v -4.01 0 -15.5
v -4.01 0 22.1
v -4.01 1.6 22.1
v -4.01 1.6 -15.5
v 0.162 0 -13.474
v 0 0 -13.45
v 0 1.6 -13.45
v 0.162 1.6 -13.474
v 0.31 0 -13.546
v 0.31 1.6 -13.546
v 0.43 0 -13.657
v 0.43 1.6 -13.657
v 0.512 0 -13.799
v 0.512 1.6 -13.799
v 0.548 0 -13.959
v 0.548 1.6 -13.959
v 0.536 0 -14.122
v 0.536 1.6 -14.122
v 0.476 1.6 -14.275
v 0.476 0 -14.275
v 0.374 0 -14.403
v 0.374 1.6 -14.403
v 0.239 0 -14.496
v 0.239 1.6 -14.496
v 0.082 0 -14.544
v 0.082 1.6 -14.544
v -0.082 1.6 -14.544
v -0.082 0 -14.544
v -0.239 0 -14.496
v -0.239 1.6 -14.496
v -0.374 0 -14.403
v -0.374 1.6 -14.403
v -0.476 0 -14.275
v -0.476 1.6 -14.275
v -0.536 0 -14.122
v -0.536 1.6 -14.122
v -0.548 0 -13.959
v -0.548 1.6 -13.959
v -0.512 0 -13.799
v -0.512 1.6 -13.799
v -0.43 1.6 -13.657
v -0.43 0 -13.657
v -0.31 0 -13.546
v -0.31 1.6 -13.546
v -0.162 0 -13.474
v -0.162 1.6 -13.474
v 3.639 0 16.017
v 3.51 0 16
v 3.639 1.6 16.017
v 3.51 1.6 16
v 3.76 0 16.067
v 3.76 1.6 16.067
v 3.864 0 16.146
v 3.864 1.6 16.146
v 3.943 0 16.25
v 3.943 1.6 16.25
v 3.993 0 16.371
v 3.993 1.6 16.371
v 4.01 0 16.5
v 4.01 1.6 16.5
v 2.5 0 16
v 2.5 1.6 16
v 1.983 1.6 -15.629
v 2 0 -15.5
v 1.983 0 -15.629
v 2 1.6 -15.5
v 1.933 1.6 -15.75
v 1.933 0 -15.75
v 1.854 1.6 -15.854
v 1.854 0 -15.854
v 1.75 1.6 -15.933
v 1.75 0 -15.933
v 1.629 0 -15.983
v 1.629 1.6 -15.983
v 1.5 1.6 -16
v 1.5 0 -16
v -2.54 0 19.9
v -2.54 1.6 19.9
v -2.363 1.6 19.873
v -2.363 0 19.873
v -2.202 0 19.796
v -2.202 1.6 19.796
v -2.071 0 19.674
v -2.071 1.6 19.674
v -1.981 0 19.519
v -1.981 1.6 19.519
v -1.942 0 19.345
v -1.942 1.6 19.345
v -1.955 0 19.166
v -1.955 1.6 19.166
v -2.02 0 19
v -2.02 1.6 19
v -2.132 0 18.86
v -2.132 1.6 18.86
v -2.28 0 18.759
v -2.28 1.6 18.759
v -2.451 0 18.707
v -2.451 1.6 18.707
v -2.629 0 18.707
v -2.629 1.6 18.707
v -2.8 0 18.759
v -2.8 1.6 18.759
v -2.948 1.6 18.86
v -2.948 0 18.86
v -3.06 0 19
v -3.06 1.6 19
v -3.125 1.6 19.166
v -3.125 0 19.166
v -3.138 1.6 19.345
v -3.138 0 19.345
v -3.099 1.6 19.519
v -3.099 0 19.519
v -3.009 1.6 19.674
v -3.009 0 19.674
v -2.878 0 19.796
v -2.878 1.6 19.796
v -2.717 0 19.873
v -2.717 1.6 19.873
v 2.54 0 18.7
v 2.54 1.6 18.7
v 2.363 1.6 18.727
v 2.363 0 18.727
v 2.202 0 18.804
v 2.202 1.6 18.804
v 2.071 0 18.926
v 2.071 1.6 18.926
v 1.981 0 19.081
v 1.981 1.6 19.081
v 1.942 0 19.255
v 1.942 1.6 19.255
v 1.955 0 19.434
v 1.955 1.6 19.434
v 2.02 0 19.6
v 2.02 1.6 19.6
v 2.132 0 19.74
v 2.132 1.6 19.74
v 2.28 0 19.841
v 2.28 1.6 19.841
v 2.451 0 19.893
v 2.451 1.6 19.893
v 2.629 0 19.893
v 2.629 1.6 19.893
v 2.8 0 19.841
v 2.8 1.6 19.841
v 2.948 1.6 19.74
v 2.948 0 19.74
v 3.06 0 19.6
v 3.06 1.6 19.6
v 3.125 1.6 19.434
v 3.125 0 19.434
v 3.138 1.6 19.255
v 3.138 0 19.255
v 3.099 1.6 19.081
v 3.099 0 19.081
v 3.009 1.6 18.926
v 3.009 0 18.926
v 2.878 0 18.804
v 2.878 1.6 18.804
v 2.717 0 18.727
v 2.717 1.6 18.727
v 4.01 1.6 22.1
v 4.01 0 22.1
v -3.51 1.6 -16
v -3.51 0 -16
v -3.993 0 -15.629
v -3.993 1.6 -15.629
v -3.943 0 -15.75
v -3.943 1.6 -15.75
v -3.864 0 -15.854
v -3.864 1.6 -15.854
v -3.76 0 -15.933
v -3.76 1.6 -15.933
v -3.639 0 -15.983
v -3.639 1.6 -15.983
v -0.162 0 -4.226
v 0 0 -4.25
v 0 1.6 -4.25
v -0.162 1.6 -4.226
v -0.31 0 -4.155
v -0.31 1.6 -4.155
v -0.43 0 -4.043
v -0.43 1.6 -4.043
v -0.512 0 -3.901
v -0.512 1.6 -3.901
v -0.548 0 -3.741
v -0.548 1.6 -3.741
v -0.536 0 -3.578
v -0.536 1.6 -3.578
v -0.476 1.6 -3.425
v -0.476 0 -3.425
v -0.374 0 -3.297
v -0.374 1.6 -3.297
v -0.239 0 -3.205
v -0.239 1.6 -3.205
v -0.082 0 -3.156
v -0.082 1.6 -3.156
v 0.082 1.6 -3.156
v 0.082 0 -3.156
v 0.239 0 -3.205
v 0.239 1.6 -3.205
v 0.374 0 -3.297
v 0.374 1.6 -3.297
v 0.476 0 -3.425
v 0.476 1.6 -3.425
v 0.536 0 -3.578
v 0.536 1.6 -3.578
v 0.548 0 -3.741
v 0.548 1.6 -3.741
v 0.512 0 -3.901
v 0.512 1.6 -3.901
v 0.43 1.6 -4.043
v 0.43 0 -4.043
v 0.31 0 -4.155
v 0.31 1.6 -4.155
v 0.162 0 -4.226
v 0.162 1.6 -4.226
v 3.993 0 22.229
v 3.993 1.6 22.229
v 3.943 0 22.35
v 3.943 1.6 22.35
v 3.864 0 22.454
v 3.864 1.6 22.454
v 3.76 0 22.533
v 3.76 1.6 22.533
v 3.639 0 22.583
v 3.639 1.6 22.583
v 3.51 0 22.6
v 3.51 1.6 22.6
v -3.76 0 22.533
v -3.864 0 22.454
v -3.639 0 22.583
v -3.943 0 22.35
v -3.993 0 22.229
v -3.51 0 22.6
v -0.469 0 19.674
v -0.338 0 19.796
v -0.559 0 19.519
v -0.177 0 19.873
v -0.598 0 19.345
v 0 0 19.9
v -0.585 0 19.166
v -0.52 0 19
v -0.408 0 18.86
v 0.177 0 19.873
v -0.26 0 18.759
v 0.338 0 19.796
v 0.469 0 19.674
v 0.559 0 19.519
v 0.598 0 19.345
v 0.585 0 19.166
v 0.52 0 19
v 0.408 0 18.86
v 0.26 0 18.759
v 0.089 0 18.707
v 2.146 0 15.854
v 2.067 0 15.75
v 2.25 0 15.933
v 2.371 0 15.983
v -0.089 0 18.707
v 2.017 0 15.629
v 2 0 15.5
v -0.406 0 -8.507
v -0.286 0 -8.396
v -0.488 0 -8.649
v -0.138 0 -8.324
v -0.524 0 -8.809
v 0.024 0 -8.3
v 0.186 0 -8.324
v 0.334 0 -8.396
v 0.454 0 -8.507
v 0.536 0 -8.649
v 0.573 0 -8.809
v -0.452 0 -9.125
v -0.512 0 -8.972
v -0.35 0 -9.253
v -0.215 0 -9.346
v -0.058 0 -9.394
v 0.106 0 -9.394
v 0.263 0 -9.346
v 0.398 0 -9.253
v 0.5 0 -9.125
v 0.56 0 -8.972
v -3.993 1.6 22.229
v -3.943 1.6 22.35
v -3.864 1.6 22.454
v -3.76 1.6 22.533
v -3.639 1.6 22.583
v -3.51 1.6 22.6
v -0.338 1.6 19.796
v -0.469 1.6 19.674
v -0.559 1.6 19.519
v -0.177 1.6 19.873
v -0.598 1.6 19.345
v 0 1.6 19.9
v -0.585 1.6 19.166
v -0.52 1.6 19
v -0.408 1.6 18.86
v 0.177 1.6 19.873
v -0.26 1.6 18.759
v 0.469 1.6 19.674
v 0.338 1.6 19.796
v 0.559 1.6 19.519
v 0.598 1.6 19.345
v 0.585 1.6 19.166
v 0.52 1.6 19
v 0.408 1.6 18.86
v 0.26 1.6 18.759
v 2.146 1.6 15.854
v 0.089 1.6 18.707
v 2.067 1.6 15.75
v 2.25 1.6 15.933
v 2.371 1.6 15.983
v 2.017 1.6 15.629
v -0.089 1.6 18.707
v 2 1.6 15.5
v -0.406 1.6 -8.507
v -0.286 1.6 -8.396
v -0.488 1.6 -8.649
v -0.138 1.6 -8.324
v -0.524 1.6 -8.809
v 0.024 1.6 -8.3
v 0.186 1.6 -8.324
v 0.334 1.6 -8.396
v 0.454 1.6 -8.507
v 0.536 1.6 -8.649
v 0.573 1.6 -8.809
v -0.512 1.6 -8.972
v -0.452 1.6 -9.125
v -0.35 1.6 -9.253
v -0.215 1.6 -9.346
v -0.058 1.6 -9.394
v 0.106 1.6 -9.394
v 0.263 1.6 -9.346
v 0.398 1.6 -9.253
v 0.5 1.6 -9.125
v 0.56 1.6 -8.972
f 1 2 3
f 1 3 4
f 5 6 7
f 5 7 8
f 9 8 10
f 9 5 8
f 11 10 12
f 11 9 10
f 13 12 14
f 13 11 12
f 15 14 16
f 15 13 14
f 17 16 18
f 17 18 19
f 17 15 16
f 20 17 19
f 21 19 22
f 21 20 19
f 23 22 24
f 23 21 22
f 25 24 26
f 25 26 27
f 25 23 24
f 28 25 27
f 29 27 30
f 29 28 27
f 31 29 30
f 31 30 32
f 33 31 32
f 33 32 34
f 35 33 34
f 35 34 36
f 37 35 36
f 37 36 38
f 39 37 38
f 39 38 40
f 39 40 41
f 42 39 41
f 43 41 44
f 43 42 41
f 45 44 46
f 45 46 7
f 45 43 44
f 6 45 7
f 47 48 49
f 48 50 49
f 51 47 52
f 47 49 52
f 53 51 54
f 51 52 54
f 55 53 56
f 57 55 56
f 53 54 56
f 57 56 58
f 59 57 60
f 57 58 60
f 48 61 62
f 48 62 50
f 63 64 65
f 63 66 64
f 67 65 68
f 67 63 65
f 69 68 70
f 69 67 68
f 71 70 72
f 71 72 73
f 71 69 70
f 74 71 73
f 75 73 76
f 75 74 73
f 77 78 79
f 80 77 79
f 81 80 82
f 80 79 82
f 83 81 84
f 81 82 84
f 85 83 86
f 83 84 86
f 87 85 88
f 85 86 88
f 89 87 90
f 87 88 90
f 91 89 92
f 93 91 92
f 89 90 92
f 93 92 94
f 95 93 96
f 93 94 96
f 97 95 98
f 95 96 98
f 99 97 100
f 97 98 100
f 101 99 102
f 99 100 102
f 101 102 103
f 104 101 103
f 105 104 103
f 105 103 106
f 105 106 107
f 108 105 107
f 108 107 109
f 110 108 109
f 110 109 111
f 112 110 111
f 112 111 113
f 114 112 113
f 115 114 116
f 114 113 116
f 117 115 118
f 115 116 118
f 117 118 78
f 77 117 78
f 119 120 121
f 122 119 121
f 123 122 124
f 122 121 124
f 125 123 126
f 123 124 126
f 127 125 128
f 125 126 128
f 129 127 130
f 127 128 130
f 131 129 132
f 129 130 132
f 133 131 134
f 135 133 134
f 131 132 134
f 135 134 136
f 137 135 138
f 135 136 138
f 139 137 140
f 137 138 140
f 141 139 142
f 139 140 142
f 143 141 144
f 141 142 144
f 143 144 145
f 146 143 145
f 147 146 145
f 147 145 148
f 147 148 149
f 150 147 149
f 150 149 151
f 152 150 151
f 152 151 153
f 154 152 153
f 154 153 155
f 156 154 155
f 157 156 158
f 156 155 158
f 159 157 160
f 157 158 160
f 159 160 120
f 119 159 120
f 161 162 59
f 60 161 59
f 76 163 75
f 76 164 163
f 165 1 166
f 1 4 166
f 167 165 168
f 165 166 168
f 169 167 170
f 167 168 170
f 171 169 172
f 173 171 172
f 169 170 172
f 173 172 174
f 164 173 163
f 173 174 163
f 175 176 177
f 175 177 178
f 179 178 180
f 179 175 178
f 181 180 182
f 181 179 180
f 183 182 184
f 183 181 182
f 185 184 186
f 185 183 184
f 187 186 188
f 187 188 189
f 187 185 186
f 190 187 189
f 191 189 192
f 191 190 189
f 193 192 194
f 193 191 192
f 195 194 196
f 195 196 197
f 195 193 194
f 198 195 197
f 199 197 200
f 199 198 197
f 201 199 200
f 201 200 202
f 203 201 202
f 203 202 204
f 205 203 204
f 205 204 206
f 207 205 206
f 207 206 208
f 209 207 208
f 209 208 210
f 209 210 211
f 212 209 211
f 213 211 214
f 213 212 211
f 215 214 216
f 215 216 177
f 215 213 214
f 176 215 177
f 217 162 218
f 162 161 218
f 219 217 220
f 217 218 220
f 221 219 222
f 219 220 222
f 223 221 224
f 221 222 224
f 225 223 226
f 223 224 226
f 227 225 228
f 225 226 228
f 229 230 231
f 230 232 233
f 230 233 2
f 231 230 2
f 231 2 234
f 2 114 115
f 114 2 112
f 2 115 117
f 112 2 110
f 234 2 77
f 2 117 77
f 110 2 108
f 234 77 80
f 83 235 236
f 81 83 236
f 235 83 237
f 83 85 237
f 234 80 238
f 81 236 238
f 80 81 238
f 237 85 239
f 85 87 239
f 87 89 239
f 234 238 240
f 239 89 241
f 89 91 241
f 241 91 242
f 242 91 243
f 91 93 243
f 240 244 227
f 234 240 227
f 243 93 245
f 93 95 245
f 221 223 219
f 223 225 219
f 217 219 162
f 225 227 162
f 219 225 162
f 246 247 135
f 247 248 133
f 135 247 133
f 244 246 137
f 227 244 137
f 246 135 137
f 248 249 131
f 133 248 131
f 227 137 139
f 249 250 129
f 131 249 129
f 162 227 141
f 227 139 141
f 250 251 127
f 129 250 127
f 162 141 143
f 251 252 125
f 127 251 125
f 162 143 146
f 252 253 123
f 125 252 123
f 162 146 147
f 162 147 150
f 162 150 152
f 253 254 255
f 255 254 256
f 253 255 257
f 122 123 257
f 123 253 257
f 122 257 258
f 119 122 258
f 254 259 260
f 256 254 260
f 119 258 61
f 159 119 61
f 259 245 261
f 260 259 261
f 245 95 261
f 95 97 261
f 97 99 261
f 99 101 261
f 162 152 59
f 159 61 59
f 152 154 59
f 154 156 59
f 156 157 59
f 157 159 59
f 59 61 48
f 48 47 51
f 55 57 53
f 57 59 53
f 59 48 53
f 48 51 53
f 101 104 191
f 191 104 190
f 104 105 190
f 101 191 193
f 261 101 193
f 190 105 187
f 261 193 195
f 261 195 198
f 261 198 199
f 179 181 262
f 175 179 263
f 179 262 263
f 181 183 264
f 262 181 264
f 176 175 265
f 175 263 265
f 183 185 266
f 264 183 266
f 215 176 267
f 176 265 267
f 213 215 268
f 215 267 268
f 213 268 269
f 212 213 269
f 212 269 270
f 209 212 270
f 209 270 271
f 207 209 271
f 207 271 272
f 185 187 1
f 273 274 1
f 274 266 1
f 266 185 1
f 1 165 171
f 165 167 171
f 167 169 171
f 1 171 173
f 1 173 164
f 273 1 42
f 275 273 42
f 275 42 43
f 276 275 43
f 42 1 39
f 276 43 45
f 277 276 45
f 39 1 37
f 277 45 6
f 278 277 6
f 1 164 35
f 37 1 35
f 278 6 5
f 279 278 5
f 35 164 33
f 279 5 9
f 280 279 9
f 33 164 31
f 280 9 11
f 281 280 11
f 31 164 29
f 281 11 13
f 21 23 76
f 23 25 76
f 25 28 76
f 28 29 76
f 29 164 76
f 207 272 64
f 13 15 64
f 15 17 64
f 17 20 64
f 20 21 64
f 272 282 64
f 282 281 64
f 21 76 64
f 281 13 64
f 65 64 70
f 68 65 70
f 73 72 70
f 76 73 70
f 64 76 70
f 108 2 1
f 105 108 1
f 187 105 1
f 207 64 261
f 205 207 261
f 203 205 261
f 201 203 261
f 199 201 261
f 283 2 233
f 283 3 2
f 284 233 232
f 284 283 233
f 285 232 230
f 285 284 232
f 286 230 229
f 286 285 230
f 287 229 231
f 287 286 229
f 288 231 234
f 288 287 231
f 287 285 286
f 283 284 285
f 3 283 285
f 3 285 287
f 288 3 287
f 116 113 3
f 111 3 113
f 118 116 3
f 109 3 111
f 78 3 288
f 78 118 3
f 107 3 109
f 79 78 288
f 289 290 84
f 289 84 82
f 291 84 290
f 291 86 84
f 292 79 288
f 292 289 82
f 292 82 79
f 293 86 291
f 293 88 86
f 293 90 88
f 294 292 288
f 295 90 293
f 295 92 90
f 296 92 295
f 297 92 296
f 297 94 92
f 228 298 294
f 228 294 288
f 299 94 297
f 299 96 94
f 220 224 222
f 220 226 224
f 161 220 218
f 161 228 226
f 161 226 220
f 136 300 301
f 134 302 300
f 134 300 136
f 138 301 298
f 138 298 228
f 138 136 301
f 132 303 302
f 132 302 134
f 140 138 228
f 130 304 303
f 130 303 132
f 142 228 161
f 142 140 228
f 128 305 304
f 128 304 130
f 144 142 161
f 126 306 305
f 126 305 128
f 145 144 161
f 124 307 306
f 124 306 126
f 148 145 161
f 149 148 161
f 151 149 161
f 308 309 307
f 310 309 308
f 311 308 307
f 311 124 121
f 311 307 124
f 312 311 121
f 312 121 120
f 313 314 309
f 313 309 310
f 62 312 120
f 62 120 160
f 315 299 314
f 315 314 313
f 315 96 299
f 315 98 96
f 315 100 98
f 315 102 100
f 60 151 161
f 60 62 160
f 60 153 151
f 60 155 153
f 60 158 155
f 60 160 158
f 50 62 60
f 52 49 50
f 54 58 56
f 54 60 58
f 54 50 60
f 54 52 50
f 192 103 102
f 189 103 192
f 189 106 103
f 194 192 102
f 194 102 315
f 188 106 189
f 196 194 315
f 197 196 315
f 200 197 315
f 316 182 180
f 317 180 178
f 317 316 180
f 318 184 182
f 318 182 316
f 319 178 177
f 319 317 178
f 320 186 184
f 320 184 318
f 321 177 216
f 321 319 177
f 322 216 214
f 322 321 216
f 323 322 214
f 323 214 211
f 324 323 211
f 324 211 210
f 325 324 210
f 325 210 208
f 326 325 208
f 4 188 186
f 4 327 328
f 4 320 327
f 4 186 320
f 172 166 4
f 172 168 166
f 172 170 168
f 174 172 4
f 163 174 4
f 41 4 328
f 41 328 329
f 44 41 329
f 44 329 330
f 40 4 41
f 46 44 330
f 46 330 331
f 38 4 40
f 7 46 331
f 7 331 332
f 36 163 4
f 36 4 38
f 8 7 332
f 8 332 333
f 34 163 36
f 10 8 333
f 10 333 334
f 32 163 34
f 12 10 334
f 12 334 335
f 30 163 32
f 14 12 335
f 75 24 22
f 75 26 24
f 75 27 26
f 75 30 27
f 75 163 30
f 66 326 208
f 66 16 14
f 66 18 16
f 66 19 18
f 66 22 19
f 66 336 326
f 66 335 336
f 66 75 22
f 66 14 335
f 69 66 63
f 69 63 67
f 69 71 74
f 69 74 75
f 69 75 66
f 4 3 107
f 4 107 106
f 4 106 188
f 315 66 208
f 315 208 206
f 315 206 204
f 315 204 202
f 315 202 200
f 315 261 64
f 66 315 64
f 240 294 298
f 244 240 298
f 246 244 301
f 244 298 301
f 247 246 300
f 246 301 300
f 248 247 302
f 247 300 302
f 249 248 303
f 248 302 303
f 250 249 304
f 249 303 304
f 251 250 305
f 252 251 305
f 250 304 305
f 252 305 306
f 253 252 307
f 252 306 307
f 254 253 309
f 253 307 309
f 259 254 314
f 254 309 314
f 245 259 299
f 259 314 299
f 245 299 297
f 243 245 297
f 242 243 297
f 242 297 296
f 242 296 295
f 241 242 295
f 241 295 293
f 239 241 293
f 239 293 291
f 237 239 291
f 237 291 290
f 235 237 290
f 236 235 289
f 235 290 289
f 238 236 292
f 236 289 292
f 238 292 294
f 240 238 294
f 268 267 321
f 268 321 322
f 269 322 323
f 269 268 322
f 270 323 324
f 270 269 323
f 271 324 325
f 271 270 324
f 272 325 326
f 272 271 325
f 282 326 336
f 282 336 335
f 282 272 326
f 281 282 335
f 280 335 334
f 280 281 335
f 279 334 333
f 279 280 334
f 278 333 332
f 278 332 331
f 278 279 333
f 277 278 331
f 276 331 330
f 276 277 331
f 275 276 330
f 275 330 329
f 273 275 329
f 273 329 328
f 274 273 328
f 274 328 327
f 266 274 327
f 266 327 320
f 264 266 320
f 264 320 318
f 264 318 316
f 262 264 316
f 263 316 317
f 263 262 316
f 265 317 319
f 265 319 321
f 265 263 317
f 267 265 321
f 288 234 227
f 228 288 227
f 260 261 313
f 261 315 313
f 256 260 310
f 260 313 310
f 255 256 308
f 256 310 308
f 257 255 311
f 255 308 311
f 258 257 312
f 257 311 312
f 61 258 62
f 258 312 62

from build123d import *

# Parameters (mm, degrees)
SKETCH_1_W          = 4
SKETCH_1_H          = 32
SKETCH_1_R          = 0.55
EXTRUDE_1_DEPTH     = 1.6
SKETCH_3_W          = 8.02
SKETCH_3_H          = 6.6
EXTRUDE_2_DEPTH     = 1.6
SKETCH_4_R          = 0.6
CUT_EXTRUDE_1_DEPTH = 1.6
SKETCH_6_W          = 2.01
SKETCH_6_H          = 32
EXTRUDE_3_DEPTH     = 1.6
FILLET_1_R          = 0.5


with BuildPart() as part:
    # 草图1 → 凸台-拉伸1 (new body)
    with BuildSketch(Plane(origin=(0, 0, 0), x_dir=(1, 0, 0), z_dir=(0, 1, 0))):
        Rectangle(SKETCH_1_W, SKETCH_1_H)
        with Locations(Location((0.024094886, 8.850056366, 0), (0, 0, 270))):
            Circle(SKETCH_1_R, mode=Mode.SUBTRACT)
        with Locations(Location((0, 14, 0), (0, 0, 270))):
            Circle(SKETCH_1_R, mode=Mode.SUBTRACT)
        with Locations(Location((0, 3.700112731, 0), (0, 0, 90))):
            Circle(SKETCH_1_R, mode=Mode.SUBTRACT)
    extrude(amount=EXTRUDE_1_DEPTH)

    # 草图3 → 凸台-拉伸2 (add)
    with BuildSketch(Plane(origin=(0, 0, 0), x_dir=(1, 0, 0), z_dir=(0, 1, 0))):
        with Locations((0, -19.3)):
            Rectangle(SKETCH_3_W, SKETCH_3_H)
    extrude(amount=EXTRUDE_2_DEPTH)

    # 草图4 → 切除-拉伸1 (cut)
    with BuildSketch(Plane(origin=(0, 1.6, 0), x_dir=(1, 0, 0), z_dir=(0, 1, 0))):
        with Locations(Location((0, -19.3, 0), (0, 0, 270))):
            Circle(SKETCH_4_R)
        with Locations(Location((-2.54, -19.3, 0), (0, 0, 270))):
            Circle(SKETCH_4_R)
        with Locations(Location((2.54, -19.3, 0), (0, 0, 90))):
            Circle(SKETCH_4_R)
    extrude(amount=-CUT_EXTRUDE_1_DEPTH, mode=Mode.SUBTRACT)

    # 草图6 → 凸台-拉伸3 (add)
    with BuildSketch(Plane(origin=(0, 0, 0), x_dir=(1, 0, 0), z_dir=(0, 1, 0))):
        with Locations((-3.005, 0)):
            Rectangle(SKETCH_6_W, SKETCH_6_H)
    extrude(amount=EXTRUDE_3_DEPTH)

    # 圆角1
    fillet_1_edges = [part.edges().sort_by_distance(p)[0] for p in [
        (4.01, 0.8, 22.6),
        (4.01, 0.8, 16),
        (-4.01, 0.8, 22.6),
        (-4.01, 0.8, -16),
        (2, 0.8, 16),
        (2, 0.8, -16),
    ]]
    fillet(fillet_1_edges, radius=FILLET_1_R)


solid = part.part
